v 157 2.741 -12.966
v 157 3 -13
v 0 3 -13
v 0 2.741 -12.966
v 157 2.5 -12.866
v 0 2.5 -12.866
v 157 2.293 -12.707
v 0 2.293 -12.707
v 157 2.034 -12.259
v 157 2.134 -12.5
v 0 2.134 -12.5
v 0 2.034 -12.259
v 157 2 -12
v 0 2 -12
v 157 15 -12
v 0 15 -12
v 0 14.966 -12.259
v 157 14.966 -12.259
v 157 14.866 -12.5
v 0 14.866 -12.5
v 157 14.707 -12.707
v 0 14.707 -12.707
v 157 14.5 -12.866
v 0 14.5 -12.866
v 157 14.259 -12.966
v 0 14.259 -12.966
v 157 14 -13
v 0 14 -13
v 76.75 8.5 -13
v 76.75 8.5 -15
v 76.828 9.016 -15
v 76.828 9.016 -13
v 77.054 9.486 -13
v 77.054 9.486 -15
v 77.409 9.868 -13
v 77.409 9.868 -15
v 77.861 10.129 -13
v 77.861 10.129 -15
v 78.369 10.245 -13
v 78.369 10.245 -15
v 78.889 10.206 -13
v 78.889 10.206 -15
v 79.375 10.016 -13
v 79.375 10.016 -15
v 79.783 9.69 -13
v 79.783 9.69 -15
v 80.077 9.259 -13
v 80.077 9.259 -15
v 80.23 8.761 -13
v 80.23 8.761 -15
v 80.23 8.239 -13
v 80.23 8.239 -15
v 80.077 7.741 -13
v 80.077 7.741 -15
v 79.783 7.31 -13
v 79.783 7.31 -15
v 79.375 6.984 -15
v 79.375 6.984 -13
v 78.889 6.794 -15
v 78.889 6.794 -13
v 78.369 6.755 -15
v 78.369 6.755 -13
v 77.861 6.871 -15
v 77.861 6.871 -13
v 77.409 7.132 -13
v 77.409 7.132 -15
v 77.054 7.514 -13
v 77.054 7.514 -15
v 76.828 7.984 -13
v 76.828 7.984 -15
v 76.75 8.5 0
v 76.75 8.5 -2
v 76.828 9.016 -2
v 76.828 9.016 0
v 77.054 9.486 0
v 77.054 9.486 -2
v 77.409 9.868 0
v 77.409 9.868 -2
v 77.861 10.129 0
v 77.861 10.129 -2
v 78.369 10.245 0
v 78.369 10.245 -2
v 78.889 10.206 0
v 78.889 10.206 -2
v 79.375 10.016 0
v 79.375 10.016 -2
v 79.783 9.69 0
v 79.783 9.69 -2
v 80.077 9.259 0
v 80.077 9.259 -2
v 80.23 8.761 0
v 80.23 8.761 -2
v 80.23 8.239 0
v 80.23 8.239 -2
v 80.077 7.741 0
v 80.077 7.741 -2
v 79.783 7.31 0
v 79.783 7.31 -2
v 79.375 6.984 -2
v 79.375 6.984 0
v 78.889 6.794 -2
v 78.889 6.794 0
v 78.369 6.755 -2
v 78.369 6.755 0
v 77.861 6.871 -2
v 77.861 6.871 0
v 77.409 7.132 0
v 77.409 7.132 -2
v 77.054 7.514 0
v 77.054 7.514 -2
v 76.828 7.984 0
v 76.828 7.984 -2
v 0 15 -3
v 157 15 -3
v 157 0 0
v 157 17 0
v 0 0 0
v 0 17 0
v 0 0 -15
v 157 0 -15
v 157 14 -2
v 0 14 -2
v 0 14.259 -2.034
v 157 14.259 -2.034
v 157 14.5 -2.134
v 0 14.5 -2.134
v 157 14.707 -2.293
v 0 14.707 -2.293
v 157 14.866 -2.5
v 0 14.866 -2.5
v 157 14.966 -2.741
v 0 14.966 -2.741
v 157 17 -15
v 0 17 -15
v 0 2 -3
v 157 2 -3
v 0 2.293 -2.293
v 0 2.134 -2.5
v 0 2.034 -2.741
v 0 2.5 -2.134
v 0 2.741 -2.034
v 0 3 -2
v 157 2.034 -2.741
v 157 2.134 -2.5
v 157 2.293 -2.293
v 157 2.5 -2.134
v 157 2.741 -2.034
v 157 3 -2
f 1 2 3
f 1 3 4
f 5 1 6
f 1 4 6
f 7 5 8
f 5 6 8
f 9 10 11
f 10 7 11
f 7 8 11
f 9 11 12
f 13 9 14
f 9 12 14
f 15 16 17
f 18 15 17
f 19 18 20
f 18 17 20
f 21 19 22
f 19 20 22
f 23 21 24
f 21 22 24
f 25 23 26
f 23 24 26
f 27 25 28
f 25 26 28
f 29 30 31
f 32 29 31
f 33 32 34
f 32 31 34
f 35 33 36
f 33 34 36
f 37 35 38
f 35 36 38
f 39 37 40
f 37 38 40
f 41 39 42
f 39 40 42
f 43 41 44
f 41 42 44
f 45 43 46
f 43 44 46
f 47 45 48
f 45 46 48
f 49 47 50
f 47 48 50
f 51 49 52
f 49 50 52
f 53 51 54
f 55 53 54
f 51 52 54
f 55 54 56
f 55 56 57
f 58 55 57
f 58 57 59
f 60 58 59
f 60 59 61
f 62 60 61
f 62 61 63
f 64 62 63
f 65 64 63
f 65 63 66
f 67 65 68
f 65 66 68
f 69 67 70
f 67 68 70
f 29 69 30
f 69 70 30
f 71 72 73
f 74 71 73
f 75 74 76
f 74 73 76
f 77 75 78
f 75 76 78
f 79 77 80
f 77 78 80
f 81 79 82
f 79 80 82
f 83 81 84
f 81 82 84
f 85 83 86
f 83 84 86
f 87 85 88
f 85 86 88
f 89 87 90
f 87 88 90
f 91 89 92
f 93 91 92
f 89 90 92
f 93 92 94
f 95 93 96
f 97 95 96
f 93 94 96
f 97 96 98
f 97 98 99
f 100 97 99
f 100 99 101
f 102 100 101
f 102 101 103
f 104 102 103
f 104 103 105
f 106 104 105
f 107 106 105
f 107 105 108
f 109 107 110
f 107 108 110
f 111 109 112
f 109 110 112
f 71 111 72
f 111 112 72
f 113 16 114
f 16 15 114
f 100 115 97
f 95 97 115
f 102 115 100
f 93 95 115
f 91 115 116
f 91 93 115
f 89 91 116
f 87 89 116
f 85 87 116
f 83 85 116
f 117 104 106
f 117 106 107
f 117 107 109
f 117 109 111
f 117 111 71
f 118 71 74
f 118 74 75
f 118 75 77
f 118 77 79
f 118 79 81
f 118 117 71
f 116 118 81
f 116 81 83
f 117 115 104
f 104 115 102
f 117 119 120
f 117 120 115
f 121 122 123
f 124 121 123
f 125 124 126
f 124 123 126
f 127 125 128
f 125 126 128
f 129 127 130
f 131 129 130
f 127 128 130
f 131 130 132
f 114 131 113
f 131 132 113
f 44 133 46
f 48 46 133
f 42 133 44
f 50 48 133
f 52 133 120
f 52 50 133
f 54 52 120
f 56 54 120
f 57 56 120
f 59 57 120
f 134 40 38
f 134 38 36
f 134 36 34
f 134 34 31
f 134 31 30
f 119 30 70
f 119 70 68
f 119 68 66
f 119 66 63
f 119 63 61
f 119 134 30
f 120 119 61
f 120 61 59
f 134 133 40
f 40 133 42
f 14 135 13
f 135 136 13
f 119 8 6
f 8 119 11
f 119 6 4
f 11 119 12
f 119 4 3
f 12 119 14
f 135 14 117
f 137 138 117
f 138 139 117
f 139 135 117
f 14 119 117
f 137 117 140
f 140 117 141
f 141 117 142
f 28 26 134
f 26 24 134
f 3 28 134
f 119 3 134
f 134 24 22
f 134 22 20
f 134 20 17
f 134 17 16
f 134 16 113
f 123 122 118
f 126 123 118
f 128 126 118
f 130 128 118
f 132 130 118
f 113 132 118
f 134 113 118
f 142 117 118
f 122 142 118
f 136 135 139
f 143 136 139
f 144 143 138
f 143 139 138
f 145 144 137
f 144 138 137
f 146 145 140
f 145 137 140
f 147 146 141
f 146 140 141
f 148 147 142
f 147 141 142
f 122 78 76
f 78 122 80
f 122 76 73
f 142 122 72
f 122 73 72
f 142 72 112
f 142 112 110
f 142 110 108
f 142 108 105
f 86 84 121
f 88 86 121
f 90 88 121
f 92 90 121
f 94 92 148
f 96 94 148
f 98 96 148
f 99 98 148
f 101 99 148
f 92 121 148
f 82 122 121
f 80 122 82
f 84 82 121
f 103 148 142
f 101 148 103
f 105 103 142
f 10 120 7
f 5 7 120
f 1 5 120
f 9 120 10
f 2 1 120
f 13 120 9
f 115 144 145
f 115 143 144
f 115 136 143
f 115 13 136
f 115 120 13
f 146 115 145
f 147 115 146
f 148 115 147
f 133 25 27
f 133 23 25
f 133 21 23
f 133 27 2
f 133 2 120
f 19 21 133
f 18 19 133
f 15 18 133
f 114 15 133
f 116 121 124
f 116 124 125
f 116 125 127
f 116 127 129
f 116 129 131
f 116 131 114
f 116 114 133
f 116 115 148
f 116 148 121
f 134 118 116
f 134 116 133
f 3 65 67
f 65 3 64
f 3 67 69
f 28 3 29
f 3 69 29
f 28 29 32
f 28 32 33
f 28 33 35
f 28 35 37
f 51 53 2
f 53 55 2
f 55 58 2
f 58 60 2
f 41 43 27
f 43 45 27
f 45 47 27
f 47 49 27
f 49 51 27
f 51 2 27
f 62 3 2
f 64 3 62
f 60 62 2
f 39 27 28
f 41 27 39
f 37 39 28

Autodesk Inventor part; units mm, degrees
ref_plane "YZ Plane" through (0, 0, 0) normal (1, 0, 0) x (0, 1, 0)
ref_plane "XZ Plane" through (0, 0, 0) normal (0, 1, 0) x (-1, 0, 0)
ref_plane "XY Plane" through (0, 0, 0) normal (0, 0, 1) x (1, 0, 0)
sketch "Sketch2" plane through (0, 0, 0) normal (1, 0, 0) x (0, 1, 0)
  line L0 (0, 0) -> (17, 0)
  line L1 (17, 0) -> (17, -15)
  line L2 (17, -15) -> (0, -15)
  line L3 (0, -15) -> (0, 0)
  dimension "d4" = 17
  dimension "d5" = 15
extrude "Extrusion2" add sketch "Sketch2" along normal blind 157
sketch "Sketch3" plane through (157, 0, 0) normal (1, 0, 0) x (0, 0, -1)
  line L0 (0, 17) -> (0, 0) projected
  line L1 (0, 0) -> (15, 0) projected
  line L2 (15, 0) -> (15, 17) projected
  line L3 (2, 2) -> (13, 2)
  line L4 (13, 2) -> (13, 15)
  line L5 (13, 15) -> (2, 15)
  line L6 (2, 15) -> (2, 2)
  line L7 (2, 2) -> (13, 15) construction
  line L8 (13, 2) -> (2, 15) construction
  point P0 (7.5, 8.5)
  dimension "d9" = 11
  dimension "d10" = 13
extrude "Extrusion3" cut sketch "Sketch3" against normal through all
sketch "Sketch5" plane through (0, 0, -15) normal (0, 0, -1) x (-1, 0, 0)
  line L0 (0, 0) -> (-157, 0) projected
  line L1 (-157, 0) -> (0, 17)
  line L2 (-157, 0) -> (-157, 17) projected
  line L3 (0, 0) -> (-157, 17)
  circle A0 centre (-78.5, 8.5) radius 1.75
  dimension "d13" = 3.5
extrude "Extrusion4" cut sketch "Sketch5" against normal through all contours A0 L1 L3 | L3 L1 A0 | A0 L3 L1 | L3 A0 L1
fillet "Fillet1" radius 1 4 edges at (78.5, 2, -13) (78.5, 2, -2) (78.5, 15, -2) (78.5, 15, -13)
properties part number "caja perfil"
